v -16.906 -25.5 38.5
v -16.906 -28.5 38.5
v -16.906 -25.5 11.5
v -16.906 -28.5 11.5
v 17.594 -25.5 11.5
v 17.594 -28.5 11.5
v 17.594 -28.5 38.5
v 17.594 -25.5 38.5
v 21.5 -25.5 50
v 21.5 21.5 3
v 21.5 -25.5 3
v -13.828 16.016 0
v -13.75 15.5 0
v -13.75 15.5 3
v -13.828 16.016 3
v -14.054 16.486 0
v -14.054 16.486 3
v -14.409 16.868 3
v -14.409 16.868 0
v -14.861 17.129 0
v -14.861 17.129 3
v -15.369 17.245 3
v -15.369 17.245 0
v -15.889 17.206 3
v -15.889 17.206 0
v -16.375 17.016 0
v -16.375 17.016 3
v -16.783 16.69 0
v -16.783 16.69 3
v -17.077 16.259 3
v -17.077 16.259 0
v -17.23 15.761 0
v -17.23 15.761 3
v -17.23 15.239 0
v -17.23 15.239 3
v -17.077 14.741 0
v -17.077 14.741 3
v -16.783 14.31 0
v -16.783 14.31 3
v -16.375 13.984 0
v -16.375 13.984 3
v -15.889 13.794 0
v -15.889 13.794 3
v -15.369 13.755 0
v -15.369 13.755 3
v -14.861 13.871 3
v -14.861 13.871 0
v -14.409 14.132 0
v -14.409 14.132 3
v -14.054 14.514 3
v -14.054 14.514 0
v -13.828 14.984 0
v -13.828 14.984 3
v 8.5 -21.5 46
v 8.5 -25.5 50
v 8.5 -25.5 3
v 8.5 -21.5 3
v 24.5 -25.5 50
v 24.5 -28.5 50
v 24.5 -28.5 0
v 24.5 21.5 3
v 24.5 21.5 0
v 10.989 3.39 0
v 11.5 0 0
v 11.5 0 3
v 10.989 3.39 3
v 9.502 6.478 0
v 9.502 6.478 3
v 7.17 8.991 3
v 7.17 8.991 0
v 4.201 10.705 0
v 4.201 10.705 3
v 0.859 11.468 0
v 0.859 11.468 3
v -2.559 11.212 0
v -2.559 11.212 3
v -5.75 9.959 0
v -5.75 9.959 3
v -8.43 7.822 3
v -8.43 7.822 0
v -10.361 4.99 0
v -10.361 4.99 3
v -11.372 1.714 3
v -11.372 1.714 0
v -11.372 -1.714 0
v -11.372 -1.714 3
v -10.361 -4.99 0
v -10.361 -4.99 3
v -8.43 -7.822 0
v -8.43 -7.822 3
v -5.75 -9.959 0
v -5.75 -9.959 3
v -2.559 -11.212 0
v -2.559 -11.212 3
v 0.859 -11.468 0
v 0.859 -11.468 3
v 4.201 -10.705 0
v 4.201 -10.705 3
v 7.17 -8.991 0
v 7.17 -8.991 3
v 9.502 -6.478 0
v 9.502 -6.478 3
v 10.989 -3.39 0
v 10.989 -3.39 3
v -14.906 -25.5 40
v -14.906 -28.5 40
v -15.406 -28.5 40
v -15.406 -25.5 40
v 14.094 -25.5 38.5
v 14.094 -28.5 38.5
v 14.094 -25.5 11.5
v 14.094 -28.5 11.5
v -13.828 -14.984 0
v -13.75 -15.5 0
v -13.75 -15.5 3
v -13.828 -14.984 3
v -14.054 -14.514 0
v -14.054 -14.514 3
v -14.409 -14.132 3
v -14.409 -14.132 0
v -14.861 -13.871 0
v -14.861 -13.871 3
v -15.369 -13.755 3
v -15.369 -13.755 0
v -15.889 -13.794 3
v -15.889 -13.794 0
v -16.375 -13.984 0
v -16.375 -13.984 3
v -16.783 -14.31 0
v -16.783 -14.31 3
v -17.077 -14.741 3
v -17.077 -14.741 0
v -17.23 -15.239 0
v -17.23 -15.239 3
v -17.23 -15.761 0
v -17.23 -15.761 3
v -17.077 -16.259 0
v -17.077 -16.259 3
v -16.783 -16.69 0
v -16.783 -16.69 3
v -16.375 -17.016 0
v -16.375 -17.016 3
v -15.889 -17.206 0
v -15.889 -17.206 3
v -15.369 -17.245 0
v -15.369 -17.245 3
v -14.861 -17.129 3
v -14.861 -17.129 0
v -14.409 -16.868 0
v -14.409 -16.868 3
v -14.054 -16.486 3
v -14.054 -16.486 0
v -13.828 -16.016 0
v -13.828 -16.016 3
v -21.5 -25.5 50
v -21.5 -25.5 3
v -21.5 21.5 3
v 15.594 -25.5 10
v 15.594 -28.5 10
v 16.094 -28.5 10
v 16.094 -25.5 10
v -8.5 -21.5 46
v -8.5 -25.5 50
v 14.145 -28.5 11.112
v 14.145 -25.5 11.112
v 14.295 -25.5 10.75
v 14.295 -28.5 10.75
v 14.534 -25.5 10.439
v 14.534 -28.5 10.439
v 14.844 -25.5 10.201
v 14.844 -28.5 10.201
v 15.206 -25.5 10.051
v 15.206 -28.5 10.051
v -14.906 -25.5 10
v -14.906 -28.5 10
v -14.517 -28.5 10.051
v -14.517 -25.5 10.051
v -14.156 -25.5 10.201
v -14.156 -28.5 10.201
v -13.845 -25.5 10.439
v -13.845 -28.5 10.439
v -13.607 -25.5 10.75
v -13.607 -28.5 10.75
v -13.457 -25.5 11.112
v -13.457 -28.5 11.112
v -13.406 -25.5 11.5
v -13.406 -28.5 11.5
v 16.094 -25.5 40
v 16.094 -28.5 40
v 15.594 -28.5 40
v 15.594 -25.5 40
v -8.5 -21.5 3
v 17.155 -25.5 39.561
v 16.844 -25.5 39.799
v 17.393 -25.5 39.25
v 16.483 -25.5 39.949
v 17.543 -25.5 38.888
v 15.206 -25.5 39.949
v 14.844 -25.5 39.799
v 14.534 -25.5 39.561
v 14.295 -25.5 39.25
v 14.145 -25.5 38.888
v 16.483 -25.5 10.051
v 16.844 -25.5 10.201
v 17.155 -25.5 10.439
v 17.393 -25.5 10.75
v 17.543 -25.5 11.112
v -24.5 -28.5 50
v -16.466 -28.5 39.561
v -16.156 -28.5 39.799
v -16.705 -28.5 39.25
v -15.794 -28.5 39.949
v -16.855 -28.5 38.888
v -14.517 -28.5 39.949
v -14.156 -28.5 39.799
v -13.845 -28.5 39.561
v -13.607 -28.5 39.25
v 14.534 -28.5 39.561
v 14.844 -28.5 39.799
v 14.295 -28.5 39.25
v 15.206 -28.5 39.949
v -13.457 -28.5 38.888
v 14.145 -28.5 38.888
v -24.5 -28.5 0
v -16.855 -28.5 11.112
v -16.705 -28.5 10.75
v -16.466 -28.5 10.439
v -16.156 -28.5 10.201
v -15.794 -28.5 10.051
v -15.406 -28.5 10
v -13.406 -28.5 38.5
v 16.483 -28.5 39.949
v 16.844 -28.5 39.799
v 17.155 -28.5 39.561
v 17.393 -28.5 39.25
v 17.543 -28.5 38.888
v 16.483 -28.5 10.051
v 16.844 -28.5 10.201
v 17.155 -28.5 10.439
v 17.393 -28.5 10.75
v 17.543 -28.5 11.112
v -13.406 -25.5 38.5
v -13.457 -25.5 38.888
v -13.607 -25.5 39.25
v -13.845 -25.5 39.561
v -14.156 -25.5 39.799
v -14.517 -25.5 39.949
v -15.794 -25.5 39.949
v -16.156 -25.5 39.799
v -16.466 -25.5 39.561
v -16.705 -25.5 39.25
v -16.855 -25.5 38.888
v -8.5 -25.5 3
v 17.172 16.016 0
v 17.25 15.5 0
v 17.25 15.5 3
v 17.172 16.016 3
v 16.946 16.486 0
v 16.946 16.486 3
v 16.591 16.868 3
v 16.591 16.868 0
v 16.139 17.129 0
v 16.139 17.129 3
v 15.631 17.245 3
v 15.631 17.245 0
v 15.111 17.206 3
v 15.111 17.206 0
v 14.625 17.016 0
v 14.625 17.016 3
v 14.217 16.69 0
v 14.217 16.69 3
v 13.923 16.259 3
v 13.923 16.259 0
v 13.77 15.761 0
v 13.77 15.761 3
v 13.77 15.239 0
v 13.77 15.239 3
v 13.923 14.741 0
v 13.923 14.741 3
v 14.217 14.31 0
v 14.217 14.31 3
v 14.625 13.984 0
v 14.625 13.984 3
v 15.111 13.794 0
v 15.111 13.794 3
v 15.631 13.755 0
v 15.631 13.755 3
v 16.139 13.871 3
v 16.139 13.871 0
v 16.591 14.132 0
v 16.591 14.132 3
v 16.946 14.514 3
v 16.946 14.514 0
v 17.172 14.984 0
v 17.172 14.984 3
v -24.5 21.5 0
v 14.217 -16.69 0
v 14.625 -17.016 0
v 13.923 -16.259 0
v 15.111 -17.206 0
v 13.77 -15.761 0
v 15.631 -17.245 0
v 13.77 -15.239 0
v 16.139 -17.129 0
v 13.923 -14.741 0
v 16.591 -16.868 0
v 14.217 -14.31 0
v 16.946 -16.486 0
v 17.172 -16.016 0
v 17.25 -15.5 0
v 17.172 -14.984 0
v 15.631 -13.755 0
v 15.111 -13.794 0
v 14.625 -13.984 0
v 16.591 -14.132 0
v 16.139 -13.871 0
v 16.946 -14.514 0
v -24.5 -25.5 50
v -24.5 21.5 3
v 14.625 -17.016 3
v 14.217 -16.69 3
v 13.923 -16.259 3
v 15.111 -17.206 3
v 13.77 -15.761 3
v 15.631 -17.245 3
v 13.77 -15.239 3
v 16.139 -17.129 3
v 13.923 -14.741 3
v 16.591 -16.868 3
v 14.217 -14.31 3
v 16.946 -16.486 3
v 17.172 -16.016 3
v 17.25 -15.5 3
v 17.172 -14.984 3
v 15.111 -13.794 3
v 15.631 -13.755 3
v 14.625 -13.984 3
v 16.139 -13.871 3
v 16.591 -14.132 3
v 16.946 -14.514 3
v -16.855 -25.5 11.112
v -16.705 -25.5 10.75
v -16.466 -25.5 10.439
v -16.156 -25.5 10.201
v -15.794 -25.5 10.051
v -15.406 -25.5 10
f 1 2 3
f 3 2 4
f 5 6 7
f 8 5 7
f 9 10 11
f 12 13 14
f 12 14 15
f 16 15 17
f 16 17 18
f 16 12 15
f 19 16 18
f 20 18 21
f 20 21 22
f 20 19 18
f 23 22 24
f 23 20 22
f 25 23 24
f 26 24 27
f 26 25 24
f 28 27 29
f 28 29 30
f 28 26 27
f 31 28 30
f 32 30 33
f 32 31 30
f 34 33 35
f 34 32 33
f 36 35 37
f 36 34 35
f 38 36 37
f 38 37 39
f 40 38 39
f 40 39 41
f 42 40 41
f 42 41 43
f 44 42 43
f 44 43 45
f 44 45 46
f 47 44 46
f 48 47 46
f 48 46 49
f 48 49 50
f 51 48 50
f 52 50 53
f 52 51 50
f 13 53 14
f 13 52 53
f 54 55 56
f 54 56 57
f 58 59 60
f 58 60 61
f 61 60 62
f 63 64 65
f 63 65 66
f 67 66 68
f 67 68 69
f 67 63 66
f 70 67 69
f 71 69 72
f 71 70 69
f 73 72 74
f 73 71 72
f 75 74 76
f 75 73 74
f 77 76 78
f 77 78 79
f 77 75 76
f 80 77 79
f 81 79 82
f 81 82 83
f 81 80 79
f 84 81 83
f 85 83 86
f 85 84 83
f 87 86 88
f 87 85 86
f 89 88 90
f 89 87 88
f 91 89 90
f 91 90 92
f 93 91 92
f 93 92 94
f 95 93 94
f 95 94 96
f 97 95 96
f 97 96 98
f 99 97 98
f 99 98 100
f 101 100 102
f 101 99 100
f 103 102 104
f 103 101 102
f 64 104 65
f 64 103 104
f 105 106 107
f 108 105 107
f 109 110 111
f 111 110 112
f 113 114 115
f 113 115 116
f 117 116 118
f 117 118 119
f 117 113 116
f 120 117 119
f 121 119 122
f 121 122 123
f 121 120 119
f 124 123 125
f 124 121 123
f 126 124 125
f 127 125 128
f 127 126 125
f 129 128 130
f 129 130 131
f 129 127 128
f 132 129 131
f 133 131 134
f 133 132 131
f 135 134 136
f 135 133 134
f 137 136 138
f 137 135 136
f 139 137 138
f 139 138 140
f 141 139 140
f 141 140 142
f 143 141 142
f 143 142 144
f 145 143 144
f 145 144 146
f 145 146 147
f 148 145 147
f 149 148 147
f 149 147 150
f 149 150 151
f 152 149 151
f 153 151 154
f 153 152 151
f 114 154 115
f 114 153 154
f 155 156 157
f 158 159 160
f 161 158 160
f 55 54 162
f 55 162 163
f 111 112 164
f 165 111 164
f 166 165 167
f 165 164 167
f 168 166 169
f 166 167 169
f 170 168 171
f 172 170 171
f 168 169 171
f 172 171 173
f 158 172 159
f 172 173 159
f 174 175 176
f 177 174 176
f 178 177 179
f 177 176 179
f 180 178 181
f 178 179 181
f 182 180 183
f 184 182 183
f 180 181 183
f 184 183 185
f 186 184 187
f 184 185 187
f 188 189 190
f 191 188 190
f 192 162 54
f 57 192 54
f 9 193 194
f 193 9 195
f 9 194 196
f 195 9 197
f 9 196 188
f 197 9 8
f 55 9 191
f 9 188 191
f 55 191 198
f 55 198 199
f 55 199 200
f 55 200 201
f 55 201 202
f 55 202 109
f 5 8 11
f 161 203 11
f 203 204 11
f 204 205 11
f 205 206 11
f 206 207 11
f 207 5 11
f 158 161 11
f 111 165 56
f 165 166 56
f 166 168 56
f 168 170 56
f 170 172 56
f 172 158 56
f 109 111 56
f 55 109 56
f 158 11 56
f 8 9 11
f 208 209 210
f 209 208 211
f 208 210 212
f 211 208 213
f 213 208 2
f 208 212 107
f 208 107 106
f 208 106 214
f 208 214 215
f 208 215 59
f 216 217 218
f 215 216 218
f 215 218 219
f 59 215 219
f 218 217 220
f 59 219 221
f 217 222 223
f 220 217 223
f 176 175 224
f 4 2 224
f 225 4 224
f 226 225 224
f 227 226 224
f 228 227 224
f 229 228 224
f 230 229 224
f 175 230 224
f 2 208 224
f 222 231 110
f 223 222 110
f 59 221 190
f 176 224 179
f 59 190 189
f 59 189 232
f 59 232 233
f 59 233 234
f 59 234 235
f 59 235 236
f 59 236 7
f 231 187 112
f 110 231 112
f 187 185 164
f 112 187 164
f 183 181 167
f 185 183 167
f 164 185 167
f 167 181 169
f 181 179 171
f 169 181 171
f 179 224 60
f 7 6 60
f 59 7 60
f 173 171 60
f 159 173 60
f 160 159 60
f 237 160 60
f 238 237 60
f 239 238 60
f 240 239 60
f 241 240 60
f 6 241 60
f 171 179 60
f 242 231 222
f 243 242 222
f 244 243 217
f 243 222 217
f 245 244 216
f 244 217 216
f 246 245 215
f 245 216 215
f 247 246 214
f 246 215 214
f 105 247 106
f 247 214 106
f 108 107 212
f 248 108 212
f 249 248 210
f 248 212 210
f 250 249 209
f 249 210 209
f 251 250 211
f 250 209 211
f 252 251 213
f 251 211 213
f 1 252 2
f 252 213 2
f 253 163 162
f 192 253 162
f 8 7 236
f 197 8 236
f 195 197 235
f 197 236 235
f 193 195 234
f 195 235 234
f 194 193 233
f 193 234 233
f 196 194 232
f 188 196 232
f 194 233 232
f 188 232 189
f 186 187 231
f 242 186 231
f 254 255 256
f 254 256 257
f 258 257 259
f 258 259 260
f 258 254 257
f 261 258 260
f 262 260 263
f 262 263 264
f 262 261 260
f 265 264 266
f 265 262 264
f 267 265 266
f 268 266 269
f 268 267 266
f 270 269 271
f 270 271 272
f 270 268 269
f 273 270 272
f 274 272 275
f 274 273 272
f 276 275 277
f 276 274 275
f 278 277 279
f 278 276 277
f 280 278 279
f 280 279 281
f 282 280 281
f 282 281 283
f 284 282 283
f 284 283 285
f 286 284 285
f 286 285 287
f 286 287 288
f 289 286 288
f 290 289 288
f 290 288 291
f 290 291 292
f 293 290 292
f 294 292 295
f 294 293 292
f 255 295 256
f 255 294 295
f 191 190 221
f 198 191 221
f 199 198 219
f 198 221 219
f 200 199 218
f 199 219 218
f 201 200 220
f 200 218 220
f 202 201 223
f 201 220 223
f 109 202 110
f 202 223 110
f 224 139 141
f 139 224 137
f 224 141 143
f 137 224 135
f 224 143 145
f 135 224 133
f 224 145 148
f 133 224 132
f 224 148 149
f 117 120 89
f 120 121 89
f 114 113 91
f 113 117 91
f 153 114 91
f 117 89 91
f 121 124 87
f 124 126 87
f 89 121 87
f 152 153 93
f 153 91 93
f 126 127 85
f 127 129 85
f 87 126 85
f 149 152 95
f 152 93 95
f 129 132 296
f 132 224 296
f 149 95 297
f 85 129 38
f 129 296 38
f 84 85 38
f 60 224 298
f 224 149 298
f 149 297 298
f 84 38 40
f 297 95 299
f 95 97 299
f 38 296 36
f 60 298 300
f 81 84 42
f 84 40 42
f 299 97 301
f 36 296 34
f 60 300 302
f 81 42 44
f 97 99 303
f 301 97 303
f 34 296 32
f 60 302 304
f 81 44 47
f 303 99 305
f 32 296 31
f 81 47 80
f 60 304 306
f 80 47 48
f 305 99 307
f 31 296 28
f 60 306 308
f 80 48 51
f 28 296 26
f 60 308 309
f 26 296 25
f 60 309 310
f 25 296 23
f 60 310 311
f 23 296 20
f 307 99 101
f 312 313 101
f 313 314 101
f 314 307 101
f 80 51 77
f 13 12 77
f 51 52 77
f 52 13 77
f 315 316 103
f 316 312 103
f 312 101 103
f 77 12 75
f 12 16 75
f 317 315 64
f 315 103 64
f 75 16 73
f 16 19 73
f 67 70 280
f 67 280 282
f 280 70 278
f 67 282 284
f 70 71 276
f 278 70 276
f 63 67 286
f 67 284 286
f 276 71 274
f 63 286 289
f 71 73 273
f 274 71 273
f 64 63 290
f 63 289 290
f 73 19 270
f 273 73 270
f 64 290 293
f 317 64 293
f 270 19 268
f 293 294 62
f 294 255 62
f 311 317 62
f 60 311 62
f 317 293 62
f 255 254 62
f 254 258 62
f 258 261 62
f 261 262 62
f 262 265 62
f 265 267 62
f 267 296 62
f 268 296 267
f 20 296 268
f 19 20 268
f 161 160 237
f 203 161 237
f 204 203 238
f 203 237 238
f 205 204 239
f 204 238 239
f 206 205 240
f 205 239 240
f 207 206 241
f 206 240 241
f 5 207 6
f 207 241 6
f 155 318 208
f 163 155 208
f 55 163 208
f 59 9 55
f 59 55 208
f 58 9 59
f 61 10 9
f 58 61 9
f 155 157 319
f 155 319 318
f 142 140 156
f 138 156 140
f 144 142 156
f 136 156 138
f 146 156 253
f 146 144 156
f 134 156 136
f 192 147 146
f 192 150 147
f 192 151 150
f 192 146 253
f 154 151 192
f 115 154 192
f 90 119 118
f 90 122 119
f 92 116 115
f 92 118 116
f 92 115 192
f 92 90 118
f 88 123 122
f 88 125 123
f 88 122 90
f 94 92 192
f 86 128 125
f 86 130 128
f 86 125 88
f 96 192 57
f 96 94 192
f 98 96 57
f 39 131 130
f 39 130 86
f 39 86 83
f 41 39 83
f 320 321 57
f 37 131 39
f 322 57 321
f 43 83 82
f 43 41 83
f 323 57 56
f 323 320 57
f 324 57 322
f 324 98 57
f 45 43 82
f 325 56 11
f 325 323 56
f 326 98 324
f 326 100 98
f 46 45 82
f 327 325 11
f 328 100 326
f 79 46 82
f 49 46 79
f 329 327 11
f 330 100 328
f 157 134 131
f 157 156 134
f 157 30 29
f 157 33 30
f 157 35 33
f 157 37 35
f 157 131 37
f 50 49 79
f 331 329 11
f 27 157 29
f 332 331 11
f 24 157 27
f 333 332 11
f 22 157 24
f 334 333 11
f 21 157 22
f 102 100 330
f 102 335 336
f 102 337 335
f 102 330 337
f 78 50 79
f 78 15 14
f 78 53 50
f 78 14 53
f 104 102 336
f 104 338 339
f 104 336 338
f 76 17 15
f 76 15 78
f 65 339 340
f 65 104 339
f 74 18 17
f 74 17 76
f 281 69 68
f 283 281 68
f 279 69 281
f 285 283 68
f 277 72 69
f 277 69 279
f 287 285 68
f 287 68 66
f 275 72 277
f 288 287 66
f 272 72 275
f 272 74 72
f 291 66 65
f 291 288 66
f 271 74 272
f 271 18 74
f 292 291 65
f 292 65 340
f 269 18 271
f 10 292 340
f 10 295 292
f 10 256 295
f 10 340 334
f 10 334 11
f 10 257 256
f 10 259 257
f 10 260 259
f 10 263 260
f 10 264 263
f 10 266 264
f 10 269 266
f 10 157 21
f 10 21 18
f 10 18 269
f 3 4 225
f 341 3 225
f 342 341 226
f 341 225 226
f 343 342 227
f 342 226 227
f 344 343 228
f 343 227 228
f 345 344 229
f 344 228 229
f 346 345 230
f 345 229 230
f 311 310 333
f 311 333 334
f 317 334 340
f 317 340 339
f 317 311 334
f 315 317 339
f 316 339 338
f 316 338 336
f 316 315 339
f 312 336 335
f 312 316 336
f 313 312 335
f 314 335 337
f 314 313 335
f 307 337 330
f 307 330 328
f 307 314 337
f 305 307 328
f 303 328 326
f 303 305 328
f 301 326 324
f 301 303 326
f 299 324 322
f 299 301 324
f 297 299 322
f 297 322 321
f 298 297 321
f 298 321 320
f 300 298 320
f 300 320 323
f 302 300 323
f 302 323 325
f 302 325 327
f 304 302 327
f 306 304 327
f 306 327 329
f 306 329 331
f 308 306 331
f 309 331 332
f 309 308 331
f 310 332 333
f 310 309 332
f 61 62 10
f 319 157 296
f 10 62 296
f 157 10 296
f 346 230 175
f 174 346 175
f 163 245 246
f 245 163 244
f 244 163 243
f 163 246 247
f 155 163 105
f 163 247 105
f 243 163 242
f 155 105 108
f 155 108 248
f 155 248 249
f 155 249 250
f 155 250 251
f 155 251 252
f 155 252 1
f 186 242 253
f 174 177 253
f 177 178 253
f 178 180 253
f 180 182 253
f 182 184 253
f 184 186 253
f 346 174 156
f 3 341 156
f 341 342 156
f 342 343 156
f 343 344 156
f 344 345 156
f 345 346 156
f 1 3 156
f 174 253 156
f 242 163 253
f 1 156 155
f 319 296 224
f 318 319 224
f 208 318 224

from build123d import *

# Parameters (mm, degrees)
F0_W          = 17
F0_H          = 4
F1_DEPTH      = 50
F0_R          = 1.75
F0_R_2        = 11.5
F0_W_2        = 13
F2_DEPTH      = 3
F4_DEPTH      = 5
F4_DEPTH_BACK = 50
F6_DEPTH      = 3


with BuildPart() as f1:
    # F0 (on Top) → F1 (new body)
    with BuildSketch(Plane.XY):
        Polygon((-21.5, -21.5), (-21.5, 21.5), (-24.5, 21.5), (-24.5, -25.5), (-21.5, -25.5), align=None)
        Polygon((24.5, -25.5), (21.5, -25.5), (8.5, -25.5), (-8.5, -25.5), (-21.5, -25.5), (-24.5, -25.5), (-24.5, -28.5), (24.5, -28.5), align=None)
        Polygon((24.5, 21.5), (21.5, 21.5), (21.5, -21.5), (21.5, -25.5), (24.5, -25.5), align=None)
        with Locations((0, -23.5)):
            Rectangle(F0_W, F0_H)
    extrude(amount=F1_DEPTH)

    # F0 (on Top) → F2 (join)
    with BuildSketch(Plane.XY):
        Polygon((21.5, -21.5), (21.5, 21.5), (-21.5, 21.5), (-21.5, -21.5), (-8.5, -21.5), (8.5, -21.5), align=None)
        with Locations((-15.5, -15.5)):
            Circle(F0_R, mode=Mode.SUBTRACT)
        with Locations((15.5, -15.5)):
            Circle(F0_R, mode=Mode.SUBTRACT)
        Circle(F0_R_2, mode=Mode.SUBTRACT)
        with Locations((-15.5, 15.5)):
            Circle(F0_R, mode=Mode.SUBTRACT)
        with Locations((15.5, 15.5)):
            Circle(F0_R, mode=Mode.SUBTRACT)
        with Locations((15, -23.5)):
            Rectangle(F0_W_2, F0_H)
        with Locations((-15, -23.5)):
            Rectangle(F0_W_2, F0_H)
    extrude(amount=F2_DEPTH)

    # F3 (on face) → F4 (cut, two sides)
    with BuildSketch(Plane(origin=(21.5, 0, 0), x_dir=(0, -1, 0), z_dir=(-1, 0, 0))) as f4_sk:
        Polygon((-21.5, 3), (25.5, 50), (-21.5, 50), align=None)
    extrude(amount=-F4_DEPTH, mode=Mode.SUBTRACT)
    extrude(f4_sk.sketch, amount=F4_DEPTH_BACK, mode=Mode.SUBTRACT)

    # F5 (on face) → F6 (cut)
    with BuildSketch(Plane.XZ.offset(28.5)):
        with BuildLine():
            ThreePointArc((17.5943711698, 38.5), (17.1550313416, 39.5606601718), (16.0943711698, 40))
            Line((16.0943711698, 40), (15.5943711698, 40))
            ThreePointArc((15.5943711698, 40), (14.533710998, 39.5606601718), (14.0943711698, 38.5))
            Line((14.0943711698, 38.5), (14.0943711698, 11.5))
            ThreePointArc((14.0943711698, 11.5), (14.533710998, 10.4393398282), (15.5943711698, 10))
            Line((15.5943711698, 10), (16.0943711698, 10))
            ThreePointArc((16.0943711698, 10), (17.1550313416, 10.4393398282), (17.5943711698, 11.5))
            Line((17.5943711698, 11.5), (17.5943711698, 38.5))
        make_face()
        with BuildLine():
            Line((-13.4056288302, 11.5), (-13.4056288302, 38.5))
            ThreePointArc((-13.4056288302, 38.5), (-13.8449686584, 39.5606601718), (-14.9056288302, 40))
            Line((-14.9056288302, 40), (-15.4056288302, 40))
            ThreePointArc((-15.4056288302, 40), (-16.466289002, 39.5606601718), (-16.9056288302, 38.5))
            Line((-16.9056288302, 38.5), (-16.9056288302, 11.5))
            ThreePointArc((-16.9056288302, 11.5), (-16.466289002, 10.4393398282), (-15.4056288302, 10))
            Line((-15.4056288302, 10), (-14.9056288302, 10))
            ThreePointArc((-14.9056288302, 10), (-13.8449686584, 10.4393398282), (-13.4056288302, 11.5))
        make_face()
    extrude(amount=-F6_DEPTH, mode=Mode.SUBTRACT)


with BuildPart() as f7_1:
    # F7: copy of F1
    add(f1.part)


with BuildPart() as f9_1:
    # F9: copy of F1
    add(f1.part)


solid = f1.part
